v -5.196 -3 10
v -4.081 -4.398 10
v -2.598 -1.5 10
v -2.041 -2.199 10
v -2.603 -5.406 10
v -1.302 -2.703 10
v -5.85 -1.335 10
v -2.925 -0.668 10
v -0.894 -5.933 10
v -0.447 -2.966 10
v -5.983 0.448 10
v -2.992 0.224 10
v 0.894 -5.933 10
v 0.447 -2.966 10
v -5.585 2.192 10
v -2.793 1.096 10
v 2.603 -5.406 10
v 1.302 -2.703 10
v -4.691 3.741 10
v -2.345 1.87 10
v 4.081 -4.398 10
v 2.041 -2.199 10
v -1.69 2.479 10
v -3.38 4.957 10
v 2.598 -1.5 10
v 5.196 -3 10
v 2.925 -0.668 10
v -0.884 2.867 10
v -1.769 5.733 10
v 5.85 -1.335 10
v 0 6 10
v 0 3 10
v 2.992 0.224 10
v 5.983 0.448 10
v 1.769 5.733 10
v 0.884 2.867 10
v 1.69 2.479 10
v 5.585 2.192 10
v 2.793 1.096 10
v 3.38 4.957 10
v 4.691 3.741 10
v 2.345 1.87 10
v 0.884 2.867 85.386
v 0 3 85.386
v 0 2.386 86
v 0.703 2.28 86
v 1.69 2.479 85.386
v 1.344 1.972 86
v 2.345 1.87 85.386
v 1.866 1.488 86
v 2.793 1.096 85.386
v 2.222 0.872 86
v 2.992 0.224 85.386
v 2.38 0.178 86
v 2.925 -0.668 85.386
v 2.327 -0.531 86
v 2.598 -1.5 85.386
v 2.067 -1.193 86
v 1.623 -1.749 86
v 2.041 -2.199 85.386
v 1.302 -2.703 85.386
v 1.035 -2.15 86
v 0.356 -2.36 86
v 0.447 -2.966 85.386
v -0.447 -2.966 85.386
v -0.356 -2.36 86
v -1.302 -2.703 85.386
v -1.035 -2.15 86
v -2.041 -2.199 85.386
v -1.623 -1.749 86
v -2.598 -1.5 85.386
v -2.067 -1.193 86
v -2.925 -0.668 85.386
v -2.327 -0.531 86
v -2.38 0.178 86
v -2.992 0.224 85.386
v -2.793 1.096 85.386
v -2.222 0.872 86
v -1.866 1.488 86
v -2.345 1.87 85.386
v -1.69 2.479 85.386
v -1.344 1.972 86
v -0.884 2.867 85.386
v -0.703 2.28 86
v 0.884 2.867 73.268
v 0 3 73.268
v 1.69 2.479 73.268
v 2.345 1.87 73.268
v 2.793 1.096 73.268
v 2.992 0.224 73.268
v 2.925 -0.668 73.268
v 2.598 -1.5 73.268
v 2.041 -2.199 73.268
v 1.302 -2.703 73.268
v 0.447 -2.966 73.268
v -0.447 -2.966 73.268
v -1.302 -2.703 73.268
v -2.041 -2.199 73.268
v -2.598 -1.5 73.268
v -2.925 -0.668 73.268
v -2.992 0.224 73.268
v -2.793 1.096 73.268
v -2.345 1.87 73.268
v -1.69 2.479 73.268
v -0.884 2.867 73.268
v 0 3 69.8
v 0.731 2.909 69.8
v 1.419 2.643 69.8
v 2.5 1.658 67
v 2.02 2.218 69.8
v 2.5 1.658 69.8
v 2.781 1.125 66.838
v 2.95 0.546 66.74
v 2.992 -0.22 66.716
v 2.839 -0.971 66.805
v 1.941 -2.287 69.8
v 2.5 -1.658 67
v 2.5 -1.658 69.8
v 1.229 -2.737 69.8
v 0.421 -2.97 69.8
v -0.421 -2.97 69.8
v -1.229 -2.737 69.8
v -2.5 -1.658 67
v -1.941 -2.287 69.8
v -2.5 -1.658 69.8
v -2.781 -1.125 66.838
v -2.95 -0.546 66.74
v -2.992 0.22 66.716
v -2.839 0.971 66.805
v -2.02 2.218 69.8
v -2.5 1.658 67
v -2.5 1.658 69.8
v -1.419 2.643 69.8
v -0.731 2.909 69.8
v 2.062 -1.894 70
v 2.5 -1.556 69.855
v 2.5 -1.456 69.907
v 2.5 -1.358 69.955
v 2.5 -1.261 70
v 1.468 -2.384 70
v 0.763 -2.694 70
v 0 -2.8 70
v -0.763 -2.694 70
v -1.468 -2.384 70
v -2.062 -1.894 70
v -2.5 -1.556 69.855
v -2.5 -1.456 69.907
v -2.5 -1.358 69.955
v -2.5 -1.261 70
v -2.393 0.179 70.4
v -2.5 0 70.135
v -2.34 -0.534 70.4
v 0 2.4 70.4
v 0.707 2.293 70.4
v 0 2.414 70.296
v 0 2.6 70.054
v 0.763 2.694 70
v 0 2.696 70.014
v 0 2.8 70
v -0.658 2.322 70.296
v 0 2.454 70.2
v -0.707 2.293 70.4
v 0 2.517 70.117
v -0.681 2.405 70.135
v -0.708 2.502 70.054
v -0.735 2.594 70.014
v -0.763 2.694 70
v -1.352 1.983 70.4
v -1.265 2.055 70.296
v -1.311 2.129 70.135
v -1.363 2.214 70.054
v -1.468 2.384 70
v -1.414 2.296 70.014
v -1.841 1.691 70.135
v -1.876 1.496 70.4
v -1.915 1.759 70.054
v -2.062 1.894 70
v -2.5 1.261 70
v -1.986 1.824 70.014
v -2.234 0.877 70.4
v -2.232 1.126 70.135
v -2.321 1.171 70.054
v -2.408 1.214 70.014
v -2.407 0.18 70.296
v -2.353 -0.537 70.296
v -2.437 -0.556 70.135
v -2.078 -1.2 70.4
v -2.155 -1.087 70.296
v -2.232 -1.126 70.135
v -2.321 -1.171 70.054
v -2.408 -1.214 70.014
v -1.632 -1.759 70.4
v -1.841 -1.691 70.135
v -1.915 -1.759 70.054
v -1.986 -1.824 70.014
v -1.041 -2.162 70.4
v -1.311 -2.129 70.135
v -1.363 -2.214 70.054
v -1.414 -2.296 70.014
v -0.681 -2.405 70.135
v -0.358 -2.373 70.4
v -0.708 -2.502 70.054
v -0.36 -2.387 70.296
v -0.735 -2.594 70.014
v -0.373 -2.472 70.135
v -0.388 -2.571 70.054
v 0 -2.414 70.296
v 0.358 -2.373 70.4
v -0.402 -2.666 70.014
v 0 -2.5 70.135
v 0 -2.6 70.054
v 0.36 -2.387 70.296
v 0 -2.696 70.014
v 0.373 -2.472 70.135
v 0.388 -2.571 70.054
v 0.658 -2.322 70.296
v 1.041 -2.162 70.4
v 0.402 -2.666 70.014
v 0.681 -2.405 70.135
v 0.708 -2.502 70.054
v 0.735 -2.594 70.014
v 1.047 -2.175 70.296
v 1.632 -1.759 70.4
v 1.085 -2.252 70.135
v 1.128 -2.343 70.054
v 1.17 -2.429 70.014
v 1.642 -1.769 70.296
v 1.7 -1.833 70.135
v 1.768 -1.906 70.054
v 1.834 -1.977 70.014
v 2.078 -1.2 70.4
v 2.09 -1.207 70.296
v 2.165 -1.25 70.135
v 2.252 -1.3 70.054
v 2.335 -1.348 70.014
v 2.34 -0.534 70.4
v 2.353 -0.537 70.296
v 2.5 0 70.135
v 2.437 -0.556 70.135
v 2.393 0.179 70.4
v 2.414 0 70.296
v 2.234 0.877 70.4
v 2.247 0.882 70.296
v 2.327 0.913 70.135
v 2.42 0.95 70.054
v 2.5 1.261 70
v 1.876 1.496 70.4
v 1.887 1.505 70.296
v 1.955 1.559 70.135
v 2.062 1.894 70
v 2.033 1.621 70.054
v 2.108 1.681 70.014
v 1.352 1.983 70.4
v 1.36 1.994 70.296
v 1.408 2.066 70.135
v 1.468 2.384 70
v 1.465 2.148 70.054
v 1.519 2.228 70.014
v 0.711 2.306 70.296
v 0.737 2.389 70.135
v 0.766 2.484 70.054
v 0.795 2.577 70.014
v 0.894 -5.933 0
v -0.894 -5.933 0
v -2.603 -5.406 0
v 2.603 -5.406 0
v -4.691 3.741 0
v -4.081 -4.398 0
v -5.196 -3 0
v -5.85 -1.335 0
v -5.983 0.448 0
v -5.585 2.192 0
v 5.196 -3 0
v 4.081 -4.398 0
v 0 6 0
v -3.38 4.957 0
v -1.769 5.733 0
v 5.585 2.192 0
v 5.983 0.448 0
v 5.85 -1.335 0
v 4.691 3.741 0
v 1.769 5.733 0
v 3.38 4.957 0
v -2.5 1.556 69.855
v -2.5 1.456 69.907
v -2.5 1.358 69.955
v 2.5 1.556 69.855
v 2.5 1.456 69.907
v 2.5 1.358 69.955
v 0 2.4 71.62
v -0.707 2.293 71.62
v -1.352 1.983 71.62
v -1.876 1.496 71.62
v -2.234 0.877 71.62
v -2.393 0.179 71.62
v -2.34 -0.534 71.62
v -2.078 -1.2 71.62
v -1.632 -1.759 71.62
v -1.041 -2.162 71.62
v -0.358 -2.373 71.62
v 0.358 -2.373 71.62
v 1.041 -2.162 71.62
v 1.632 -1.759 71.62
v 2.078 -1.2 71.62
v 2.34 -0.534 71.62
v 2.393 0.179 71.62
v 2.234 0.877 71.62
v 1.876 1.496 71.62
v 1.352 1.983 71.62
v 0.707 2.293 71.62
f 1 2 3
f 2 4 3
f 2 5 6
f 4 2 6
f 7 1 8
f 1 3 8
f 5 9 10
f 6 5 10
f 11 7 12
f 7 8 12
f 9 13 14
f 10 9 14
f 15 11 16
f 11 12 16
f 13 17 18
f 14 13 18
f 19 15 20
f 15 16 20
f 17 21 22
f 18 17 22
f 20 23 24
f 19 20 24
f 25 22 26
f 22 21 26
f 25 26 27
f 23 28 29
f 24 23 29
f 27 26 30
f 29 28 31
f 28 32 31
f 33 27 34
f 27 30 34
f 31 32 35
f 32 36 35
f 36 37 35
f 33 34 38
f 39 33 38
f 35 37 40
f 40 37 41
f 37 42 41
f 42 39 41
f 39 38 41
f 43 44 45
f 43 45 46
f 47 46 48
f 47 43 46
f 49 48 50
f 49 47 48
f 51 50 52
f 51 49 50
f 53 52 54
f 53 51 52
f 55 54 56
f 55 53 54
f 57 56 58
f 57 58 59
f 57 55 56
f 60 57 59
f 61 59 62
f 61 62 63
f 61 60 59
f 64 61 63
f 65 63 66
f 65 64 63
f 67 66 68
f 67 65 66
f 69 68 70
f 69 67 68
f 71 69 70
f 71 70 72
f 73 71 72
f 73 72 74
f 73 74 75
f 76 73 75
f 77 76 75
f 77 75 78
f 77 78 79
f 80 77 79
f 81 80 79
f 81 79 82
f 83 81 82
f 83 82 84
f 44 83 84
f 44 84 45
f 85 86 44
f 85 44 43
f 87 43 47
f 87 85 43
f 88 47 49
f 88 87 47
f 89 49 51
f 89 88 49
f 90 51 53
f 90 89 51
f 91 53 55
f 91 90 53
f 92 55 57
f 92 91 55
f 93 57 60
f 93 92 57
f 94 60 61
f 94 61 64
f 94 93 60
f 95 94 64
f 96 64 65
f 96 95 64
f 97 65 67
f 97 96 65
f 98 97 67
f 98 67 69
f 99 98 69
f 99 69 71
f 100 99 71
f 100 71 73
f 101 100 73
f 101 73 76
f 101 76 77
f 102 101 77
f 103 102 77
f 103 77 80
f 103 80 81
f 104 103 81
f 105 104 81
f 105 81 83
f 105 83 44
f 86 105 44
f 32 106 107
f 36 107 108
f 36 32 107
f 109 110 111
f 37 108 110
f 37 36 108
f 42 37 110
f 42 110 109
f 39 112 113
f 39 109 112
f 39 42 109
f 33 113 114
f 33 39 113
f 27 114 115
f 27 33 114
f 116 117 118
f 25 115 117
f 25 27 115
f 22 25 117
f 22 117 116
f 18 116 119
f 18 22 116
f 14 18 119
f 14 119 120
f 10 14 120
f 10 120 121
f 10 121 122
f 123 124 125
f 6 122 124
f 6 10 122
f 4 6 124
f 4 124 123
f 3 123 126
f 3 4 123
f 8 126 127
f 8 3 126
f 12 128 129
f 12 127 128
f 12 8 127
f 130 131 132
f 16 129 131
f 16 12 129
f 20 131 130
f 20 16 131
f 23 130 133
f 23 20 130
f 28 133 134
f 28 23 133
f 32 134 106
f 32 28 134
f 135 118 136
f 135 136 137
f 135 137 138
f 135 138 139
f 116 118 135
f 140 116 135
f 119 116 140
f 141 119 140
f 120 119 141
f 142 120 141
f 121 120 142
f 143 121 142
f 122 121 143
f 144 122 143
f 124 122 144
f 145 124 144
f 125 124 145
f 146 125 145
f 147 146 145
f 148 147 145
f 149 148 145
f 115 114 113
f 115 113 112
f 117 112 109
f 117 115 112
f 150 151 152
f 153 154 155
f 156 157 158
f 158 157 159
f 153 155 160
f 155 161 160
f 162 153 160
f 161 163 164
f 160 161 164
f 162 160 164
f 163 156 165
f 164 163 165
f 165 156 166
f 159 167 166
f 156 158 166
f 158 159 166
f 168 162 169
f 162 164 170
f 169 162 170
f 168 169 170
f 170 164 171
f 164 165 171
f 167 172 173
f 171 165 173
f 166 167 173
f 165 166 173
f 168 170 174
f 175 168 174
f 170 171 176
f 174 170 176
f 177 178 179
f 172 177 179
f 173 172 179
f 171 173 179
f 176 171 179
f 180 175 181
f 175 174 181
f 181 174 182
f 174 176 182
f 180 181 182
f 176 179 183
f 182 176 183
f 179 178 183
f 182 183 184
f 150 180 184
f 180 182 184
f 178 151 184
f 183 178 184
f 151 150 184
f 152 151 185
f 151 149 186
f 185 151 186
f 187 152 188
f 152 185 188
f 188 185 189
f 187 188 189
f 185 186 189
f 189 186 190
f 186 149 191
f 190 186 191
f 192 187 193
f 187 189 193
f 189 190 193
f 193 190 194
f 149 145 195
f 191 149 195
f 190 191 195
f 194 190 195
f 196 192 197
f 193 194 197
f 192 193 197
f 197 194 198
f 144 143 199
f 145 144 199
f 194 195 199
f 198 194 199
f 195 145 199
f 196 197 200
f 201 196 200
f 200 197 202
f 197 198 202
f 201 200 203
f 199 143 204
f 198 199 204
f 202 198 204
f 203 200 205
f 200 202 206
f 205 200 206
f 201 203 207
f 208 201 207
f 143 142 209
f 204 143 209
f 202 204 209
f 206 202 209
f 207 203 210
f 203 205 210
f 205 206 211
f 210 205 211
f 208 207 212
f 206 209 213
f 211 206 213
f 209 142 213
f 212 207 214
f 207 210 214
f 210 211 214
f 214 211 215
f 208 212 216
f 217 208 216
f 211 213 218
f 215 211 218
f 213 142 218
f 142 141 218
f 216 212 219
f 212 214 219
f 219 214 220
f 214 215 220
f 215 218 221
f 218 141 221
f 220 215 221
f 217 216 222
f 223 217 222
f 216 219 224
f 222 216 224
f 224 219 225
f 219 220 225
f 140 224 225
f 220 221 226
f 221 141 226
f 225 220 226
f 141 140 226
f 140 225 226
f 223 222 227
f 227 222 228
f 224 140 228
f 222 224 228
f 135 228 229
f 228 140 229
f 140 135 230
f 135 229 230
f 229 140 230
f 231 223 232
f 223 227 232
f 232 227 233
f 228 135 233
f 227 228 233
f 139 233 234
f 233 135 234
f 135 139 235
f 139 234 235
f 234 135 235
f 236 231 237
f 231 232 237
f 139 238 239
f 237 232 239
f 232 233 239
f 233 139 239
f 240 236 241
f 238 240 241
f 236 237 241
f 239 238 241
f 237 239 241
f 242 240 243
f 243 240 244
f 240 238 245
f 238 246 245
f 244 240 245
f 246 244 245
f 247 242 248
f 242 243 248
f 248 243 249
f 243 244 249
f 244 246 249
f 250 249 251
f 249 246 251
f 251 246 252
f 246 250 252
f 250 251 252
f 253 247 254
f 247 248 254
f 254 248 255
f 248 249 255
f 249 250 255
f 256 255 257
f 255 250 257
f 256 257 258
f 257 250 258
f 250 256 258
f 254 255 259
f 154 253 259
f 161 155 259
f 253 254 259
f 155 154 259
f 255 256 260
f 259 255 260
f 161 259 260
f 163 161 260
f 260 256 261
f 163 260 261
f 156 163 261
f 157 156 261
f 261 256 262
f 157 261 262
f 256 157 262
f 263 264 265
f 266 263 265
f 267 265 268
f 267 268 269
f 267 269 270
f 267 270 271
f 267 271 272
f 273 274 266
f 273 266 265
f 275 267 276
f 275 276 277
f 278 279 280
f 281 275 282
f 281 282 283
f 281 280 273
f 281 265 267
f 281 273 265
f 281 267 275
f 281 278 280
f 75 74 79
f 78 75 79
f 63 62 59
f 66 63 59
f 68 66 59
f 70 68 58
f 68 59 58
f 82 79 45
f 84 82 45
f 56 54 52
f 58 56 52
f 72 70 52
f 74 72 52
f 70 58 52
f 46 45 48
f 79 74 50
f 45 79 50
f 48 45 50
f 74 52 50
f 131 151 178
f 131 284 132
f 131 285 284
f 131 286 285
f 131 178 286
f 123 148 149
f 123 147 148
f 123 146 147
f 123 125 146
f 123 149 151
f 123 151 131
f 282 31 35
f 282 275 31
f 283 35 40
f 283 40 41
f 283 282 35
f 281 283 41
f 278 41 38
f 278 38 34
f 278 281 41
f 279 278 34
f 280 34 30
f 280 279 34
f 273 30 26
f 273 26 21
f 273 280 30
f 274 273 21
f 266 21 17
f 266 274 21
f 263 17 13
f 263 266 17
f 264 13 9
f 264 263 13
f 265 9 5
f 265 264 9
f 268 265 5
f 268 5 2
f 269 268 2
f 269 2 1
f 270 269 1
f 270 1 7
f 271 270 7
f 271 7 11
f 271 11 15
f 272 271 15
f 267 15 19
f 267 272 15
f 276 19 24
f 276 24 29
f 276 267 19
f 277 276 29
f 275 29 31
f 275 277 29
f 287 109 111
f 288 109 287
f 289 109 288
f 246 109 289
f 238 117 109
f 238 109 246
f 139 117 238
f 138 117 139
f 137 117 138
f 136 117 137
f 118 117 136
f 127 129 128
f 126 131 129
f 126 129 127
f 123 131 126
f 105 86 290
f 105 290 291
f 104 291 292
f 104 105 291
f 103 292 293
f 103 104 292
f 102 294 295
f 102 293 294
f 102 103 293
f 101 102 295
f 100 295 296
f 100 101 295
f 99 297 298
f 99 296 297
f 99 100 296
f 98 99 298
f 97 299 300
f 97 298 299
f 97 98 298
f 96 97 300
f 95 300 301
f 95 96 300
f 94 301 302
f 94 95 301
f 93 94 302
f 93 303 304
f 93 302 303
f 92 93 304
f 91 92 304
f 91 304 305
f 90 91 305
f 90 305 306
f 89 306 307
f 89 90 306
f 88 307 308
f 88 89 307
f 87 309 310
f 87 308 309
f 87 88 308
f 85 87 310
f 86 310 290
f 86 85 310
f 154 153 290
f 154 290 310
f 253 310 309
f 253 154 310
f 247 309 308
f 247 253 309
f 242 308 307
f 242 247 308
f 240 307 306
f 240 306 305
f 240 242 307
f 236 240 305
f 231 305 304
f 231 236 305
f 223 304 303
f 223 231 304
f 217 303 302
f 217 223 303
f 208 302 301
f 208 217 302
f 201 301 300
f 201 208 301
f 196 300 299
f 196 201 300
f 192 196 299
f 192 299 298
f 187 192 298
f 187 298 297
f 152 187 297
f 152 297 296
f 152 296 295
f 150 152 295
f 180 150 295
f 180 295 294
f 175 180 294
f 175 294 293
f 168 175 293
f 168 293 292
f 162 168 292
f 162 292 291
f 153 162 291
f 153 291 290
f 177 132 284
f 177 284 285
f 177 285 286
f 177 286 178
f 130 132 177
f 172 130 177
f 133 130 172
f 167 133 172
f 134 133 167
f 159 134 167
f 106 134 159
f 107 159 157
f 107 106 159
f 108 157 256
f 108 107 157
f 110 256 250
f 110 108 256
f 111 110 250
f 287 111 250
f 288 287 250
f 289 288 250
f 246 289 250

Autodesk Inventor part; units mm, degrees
sketch "Sketch_3" plane through (0, 0, 0) normal (1, 0, 0) x (0, 1, 0)
  line L0 (0, 0) -> (0, 86)
  line L1 (0, 86) -> (2.3865, 86)
  line L2 (2.3865, 86) -> (3, 85.3865)
  line L3 (3, 85.3865) -> (3, 73.2685)
  line L4 (3, 73.2685) -> (2.4, 71.62)
  line L5 (2.4, 71.62) -> (2.4, 70.4)
  arc A0 (2.4, 70.4) -> (2.8, 70) centre (2.8, 70.4) ccw
  line L6 (2.8, 70) -> (3, 69.8)
  line L7 (3, 69.8) -> (3, 10)
  line L8 (3, 10) -> (6, 10)
  line L9 (6, 10) -> (6, 0)
  line L10 (6, 0) -> (0, 0)
  line L11 (0, 0) -> (0, 86)
revolve "Revolution1" add sketch "Sketch_3" angle 360 about axis through (0, 0, 0) along (0, 0, -1)
thread "Thread1" size "M6x1" class "6g" standard "ISO Metric profile" full length
sketch "Sketch_4" plane through (0, 0, 0) normal (0, 1, 0) x (-1, 0, 0)
  line L0 (5, 65.5566) -> (5, 71)
  line L1 (5, 71) -> (2.5, 71)
  line L2 (2.5, 71) -> (2.5, 67)
  line L3 (2.5, 67) -> (5, 65.5566)
extrude "Extrusion1" cut sketch "Sketch_4" along normal mid plane 6
sketch "Sketch_5" plane through (0, 0, 0) normal (0, 1, 0) x (-1, 0, 0)
  line L0 (-2.5, 67) -> (-2.5, 71)
  line L1 (-2.5, 71) -> (-5, 71)
  line L2 (-5, 71) -> (-5, 65.5566)
  line L3 (-5, 65.5566) -> (-2.5, 67)
extrude "Extrusion2" cut sketch "Sketch_5" along normal mid plane 6
ref_plane "ANBAU_XY" through (0, 0, 0) normal (0, 0, -1) x (1, 0, 0)
ref_plane "ANBAU_YZ" through (0, 0, 0) normal (1, 0, 0) x (0, -1, 0)
ref_plane "ANBAU_ZX" through (0, 0, 0) normal (0, -1, 0) x (0, 0, -1)
ref_plane "FDT_KSAUFSATZ_XY" through (0, 0, 76.2) normal (0, 0, 1) x (1, 0, 0)
ref_plane "FDT_KSAUFSATZ_YZ" through (0, 0, 76.2) normal (1, 0, 0) x (0, 1, 0)
ref_plane "FDT_KSAUFSATZ_ZX" through (0, 0, 76.2) normal (0, 1, 0) x (0, 0, 1)
ref_plane "FDT_NUT_XY" through (0, 0, 76.2) normal (0, 0, 1) x (1, 0, 0)
ref_plane "FDT_NUT_YZ" through (0, 0, 76.2) normal (1, 0, 0) x (0, 1, 0)
ref_plane "FDT_NUT_ZX" through (0, 0, 76.2) normal (0, 1, 0) x (0, 0, 1)
ref_plane "to_nut_XY" through (0, 0, 83.325) normal (0, 0, 1) x (1, 0, 0)
ref_plane "to_nut_YZ" through (0, 0, 83.325) normal (1, 0, 0) x (0, 1, 0)
ref_plane "to_nut_ZX" through (0, 0, 83.325) normal (0, 1, 0) x (0, 0, 1)
properties part number "8112003 DSNU-S-12-30-P---(P)"
